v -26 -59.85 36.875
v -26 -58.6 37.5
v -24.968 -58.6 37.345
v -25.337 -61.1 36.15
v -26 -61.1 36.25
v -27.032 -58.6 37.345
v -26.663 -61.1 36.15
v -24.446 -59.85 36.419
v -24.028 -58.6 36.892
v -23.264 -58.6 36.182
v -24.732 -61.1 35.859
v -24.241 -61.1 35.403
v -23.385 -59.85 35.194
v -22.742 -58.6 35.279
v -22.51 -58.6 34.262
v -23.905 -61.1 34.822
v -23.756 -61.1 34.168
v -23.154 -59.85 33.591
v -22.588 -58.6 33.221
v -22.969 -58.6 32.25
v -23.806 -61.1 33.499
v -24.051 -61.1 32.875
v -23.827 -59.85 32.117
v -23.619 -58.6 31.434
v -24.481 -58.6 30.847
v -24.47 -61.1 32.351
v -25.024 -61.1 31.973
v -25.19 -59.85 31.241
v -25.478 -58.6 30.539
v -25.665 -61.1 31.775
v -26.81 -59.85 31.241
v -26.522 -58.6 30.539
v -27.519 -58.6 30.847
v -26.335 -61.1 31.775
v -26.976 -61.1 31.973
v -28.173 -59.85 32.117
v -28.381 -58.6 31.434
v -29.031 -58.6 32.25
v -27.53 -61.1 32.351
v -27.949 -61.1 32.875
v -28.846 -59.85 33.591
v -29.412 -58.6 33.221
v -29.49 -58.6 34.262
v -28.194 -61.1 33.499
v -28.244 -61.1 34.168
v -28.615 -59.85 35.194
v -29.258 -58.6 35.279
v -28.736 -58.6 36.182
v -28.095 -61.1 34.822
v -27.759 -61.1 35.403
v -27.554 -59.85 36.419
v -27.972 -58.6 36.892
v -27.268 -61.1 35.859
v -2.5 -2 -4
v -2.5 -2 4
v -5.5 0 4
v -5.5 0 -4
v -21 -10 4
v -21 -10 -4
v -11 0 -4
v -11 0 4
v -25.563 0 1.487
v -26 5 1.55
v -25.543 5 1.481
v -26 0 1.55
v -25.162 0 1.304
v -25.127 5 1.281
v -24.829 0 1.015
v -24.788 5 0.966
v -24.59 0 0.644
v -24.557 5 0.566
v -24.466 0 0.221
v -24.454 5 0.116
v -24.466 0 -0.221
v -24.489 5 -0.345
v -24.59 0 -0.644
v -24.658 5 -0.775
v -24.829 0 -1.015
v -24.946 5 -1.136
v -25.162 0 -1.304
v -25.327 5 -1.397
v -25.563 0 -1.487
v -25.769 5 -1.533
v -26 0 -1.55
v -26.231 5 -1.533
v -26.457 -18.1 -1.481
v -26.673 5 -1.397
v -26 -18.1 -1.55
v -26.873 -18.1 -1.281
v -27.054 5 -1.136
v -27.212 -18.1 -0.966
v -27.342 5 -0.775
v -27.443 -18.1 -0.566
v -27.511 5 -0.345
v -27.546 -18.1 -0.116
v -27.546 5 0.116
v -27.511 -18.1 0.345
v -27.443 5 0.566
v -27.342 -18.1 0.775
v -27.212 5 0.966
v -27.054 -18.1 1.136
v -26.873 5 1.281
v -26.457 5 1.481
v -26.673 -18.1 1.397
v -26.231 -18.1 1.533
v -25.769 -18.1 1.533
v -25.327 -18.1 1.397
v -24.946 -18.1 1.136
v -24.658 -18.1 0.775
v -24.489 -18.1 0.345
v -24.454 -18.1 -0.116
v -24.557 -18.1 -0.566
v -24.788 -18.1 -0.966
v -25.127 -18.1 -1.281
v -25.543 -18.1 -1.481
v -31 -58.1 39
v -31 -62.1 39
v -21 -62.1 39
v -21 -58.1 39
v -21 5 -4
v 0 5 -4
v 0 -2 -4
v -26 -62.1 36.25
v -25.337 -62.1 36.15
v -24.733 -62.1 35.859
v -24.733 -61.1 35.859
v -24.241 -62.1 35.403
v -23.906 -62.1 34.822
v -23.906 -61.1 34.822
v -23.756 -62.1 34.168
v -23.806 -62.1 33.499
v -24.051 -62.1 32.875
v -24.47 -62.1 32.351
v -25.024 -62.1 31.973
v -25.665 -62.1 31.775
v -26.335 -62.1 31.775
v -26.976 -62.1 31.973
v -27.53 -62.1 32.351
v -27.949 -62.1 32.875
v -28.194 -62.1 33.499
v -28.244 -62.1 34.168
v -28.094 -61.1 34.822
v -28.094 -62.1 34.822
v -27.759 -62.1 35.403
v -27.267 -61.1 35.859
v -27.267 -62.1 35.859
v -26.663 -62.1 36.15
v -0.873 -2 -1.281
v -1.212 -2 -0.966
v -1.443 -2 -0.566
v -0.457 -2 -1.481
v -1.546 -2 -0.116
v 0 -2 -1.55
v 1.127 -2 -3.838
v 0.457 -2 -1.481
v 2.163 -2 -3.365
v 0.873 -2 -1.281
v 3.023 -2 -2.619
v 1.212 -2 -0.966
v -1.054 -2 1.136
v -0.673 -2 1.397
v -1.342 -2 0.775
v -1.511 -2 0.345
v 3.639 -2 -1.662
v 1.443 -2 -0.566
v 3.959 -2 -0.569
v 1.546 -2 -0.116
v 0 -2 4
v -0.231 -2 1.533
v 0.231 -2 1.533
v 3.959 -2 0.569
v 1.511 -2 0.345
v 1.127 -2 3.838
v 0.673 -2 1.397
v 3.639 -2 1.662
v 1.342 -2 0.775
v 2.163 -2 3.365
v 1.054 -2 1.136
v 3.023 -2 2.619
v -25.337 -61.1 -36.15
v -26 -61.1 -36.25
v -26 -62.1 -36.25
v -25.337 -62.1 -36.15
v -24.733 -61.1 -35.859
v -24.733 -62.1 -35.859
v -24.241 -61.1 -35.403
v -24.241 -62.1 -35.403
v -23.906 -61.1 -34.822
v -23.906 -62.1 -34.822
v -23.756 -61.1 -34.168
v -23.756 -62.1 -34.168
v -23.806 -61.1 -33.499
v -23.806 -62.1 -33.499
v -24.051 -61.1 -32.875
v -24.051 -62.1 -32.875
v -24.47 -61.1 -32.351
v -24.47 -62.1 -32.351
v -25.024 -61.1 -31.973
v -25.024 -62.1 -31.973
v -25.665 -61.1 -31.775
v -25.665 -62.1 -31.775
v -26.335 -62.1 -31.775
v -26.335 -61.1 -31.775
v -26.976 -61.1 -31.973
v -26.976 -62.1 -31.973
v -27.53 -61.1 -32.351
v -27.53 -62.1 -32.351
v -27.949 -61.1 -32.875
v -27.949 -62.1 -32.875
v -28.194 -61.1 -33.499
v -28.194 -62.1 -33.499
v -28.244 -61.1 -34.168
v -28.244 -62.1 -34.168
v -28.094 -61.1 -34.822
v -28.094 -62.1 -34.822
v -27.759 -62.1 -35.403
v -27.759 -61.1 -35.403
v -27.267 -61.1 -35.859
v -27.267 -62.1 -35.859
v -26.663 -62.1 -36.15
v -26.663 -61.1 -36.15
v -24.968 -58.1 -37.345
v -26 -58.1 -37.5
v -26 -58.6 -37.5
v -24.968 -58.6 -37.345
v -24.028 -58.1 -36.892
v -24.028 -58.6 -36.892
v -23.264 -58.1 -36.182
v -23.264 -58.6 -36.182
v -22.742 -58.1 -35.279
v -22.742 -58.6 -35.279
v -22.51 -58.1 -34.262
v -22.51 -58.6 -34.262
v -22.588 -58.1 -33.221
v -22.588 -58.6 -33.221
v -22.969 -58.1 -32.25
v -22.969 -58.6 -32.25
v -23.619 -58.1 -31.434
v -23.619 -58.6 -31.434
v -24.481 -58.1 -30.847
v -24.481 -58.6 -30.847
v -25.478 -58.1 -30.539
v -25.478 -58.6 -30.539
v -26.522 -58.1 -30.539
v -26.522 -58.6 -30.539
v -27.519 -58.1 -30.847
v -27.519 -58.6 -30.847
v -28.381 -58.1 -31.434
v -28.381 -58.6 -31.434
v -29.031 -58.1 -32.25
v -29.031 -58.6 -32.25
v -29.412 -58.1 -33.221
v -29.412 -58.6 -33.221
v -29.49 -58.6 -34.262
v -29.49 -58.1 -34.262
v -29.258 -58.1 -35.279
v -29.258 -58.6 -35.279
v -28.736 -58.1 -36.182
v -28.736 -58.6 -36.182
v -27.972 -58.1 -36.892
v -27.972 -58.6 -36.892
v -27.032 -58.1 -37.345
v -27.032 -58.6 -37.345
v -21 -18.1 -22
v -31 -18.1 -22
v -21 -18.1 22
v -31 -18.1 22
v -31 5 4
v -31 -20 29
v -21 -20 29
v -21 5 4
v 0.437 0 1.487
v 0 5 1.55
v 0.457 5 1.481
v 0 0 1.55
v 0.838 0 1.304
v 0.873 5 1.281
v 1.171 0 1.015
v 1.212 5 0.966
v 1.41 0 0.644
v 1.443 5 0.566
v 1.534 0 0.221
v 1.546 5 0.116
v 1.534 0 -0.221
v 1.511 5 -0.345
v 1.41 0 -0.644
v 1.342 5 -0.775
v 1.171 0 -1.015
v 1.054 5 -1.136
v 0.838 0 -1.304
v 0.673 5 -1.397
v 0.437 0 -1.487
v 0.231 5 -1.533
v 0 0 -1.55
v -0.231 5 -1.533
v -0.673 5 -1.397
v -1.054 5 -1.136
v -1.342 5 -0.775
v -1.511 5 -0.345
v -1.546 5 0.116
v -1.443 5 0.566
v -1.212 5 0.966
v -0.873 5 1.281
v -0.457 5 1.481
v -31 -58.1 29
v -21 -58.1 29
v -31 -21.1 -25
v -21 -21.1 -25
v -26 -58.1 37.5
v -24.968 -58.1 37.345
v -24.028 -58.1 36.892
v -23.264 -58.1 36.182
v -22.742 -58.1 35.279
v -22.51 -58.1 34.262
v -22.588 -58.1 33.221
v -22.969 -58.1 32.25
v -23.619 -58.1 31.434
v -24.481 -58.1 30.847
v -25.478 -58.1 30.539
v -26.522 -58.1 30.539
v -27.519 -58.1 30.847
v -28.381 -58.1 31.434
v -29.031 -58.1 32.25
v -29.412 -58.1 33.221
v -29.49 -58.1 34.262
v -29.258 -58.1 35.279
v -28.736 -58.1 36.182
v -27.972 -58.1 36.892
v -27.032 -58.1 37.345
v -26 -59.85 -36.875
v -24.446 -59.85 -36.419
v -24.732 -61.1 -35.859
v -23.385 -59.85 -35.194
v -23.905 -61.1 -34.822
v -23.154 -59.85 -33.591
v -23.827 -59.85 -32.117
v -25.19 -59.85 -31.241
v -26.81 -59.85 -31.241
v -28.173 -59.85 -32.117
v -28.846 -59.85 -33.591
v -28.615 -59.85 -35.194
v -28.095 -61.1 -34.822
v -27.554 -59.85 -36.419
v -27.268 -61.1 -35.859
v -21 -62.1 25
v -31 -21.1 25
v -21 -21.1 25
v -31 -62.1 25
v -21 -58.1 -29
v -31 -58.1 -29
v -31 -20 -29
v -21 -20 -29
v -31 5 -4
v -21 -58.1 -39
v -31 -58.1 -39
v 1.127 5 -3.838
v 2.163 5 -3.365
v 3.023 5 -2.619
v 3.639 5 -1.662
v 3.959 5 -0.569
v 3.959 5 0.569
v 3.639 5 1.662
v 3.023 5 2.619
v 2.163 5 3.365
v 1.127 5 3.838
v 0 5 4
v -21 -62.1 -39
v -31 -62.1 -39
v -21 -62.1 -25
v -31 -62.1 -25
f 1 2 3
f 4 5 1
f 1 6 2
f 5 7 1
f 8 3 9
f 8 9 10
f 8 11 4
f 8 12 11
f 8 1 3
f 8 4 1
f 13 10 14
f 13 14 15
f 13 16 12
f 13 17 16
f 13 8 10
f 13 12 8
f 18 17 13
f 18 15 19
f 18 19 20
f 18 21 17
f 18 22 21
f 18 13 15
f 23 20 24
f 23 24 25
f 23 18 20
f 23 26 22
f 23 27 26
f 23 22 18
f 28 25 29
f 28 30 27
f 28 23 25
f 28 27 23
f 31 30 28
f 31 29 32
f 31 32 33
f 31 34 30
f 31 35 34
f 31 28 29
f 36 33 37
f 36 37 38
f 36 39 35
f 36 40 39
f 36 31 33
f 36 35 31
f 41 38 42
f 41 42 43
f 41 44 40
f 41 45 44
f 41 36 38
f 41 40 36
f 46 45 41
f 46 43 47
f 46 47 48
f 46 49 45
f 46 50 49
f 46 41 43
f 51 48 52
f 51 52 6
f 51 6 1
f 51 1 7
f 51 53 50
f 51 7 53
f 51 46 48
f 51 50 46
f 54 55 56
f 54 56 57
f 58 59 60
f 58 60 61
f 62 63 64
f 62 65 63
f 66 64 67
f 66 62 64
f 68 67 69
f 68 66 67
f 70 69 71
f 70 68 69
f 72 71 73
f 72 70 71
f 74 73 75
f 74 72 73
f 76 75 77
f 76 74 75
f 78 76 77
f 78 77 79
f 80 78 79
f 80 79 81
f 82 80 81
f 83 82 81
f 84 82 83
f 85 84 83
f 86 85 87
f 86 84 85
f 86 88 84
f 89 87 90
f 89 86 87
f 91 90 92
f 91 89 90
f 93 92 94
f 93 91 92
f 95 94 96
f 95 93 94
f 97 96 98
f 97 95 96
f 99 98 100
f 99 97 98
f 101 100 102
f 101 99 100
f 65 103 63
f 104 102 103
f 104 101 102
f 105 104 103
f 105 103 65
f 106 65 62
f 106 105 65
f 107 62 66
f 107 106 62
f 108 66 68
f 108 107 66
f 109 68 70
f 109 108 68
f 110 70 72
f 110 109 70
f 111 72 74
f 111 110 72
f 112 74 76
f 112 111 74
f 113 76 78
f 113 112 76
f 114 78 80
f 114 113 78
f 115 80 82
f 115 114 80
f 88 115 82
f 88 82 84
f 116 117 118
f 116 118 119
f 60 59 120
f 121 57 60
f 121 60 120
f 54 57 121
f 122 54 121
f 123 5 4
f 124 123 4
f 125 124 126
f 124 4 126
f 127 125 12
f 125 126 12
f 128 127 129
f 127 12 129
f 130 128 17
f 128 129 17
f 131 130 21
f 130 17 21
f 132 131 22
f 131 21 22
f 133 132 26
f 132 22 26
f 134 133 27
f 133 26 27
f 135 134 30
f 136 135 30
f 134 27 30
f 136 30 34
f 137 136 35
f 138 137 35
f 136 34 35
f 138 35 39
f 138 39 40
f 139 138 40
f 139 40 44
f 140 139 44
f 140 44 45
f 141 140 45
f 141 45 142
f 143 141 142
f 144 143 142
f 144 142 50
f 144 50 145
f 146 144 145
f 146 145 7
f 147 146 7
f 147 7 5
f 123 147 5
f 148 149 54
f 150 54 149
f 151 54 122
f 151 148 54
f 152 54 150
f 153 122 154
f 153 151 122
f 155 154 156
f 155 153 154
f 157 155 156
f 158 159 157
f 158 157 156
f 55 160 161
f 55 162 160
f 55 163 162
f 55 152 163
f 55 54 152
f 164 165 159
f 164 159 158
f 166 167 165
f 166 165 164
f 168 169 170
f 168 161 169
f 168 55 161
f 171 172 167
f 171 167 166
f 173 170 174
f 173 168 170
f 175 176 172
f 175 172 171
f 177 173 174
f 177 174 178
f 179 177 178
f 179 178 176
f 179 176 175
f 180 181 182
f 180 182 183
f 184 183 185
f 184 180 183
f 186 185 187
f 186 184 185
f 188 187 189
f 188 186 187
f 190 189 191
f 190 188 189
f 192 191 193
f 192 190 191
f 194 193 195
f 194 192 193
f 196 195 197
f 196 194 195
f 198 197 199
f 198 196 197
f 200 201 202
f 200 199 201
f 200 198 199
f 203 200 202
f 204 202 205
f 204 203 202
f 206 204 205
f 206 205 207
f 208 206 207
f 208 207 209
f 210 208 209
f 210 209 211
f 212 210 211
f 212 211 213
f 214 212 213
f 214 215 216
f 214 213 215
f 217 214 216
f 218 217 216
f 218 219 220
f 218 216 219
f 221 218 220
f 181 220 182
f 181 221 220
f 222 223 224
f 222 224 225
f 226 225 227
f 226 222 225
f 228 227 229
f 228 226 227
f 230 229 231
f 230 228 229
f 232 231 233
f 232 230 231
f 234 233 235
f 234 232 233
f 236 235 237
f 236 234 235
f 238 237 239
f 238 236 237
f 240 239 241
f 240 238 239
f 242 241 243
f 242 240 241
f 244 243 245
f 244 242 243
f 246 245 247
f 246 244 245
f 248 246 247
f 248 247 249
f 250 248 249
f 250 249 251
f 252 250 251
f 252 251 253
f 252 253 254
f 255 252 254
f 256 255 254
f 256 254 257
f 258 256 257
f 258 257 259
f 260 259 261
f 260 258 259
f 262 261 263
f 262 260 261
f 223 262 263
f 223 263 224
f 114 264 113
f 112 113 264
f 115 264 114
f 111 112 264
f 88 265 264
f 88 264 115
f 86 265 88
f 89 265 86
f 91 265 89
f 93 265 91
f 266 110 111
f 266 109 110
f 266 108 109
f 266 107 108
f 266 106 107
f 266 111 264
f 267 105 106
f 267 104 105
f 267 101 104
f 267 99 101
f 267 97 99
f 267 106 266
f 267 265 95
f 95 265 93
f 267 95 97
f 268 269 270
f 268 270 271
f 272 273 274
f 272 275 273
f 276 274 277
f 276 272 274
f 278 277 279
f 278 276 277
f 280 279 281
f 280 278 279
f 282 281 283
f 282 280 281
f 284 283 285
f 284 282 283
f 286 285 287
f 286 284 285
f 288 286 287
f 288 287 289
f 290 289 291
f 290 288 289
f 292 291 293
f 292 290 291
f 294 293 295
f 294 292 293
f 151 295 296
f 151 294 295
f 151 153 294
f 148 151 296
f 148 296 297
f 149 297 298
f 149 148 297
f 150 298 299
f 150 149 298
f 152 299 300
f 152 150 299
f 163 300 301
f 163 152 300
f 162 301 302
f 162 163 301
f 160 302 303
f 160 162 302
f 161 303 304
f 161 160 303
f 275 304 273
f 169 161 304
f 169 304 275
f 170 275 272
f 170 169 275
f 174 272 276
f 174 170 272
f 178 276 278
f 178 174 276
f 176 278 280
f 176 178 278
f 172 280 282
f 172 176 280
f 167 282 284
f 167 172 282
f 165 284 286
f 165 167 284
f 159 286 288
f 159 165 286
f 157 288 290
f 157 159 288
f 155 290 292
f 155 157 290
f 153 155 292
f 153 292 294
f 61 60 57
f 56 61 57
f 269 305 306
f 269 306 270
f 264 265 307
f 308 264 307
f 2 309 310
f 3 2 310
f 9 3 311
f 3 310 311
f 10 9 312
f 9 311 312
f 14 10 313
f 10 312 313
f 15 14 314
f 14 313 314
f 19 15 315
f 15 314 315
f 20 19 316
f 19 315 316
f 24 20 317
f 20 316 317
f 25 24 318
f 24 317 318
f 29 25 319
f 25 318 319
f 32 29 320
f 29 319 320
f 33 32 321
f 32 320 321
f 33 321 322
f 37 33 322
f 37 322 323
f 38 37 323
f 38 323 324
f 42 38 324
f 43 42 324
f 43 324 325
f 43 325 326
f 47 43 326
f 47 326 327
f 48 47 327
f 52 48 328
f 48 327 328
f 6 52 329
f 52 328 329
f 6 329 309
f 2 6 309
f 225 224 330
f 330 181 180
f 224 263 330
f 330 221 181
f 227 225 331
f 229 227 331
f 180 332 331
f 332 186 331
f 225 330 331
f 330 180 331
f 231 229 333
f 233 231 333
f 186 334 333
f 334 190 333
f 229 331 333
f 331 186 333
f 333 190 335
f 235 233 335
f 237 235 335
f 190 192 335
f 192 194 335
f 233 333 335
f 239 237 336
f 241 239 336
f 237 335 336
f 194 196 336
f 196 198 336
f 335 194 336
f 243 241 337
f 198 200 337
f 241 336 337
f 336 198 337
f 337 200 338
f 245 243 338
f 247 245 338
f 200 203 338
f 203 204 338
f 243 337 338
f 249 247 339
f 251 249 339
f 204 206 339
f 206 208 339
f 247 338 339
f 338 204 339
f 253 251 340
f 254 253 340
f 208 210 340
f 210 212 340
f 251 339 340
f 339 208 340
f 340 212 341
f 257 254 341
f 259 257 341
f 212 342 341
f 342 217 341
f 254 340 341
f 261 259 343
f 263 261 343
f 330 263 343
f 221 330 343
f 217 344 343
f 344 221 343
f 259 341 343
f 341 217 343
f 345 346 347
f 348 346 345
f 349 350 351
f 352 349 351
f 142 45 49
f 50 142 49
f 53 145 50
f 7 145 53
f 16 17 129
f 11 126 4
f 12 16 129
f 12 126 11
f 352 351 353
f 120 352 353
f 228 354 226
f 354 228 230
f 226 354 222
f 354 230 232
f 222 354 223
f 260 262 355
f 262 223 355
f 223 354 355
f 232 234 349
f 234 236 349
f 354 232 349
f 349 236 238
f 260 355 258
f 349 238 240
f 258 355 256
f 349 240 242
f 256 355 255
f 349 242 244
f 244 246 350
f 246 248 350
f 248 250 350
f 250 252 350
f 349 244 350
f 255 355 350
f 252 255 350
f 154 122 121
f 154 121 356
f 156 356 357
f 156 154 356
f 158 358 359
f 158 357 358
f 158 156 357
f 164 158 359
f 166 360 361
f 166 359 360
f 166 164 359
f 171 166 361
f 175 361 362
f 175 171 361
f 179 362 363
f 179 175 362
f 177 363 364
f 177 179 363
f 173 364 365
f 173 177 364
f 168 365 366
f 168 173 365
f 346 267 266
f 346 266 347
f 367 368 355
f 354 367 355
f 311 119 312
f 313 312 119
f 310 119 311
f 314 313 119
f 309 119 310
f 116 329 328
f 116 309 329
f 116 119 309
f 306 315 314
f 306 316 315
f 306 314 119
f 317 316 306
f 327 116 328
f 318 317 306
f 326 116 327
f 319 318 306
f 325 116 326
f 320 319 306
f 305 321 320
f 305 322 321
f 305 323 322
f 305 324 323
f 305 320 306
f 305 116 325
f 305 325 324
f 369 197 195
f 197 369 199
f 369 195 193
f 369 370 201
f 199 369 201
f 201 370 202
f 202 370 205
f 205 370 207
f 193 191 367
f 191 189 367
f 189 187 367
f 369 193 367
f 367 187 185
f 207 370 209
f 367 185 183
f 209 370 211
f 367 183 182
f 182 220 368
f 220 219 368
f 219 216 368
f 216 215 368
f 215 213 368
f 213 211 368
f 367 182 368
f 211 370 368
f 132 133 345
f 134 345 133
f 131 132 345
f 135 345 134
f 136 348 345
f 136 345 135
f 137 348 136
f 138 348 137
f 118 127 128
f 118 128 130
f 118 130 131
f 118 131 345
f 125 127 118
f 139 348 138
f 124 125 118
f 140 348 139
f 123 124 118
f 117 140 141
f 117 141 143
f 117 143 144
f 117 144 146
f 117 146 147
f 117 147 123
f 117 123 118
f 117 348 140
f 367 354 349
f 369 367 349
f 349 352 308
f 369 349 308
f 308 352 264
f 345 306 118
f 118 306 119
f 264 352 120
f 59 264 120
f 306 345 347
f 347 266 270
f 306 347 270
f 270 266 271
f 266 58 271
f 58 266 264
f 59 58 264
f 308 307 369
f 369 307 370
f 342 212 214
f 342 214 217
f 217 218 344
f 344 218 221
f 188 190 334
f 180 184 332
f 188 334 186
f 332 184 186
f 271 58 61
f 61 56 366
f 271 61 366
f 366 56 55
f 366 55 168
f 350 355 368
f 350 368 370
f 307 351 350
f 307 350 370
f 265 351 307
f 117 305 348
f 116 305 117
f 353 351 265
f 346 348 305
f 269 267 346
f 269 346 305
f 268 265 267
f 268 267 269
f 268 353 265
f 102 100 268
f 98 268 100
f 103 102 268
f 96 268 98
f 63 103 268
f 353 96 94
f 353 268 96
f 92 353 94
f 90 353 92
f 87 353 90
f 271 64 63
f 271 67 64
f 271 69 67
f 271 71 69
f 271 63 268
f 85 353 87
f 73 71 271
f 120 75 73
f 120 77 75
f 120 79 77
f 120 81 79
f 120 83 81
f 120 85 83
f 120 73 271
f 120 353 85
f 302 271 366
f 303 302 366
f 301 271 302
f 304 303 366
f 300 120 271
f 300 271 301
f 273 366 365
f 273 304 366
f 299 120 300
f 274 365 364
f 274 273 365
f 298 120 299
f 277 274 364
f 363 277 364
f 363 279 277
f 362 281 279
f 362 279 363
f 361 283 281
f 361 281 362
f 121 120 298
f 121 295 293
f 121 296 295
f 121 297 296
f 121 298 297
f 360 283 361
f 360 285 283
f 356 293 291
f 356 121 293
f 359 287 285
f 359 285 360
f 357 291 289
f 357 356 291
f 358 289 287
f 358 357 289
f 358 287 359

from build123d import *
from build123d.topology import SkipClean

# Parameters (mm, degrees)
SKETCH1_R                 = 1.55
BOSS_EXTRUDE1_DEPTH       = 5
BOSS_EXTRUDE2_START       = 2
SKETCH2_R                 = 1.55
BOSS_EXTRUDE2_DEPTH       = 2
CHAMFER1_SIZE2            = 2
CHAMFER1_SIZE             = 3
BOSS_EXTRUDE3_START       = 18.1
SKETCH3_W                 = 10
SKETCH3_H                 = 8
SKETCH3_R                 = 1.55
BOSS_EXTRUDE3_DEPTH       = 18.1
BOSS_EXTRUDE4_DEPTH       = 10
CHAMFER2_SIZE             = 10
SKETCH6_R                 = 2.25
CUT_EXTRUDE2_DEPTH        = 81.396579529
SKETCH7_R                 = 3.5
CUT_EXTRUDE3_DEPTH        = 3
CHAMFER3_SIZE2            = 1.25
CHAMFER3_SIZE             = 2.5
CHAMFER3_OF_MIRROR2_SIZE2 = 1.25
CHAMFER3_OF_MIRROR2_SIZE  = 2.5


with BuildPart() as part:
    # Sketch1 → Boss-Extrude1 (new body)
    with BuildSketch(Plane(origin=(0, 0, 0), x_dir=(1, 0, 0), z_dir=(0, 1, 0))):
        with BuildLine():
            Line((0, 4), (-31, 4))
            Line((-31, 4), (-31, -4))
            Line((-31, -4), (0, -4))
            ThreePointArc((0, -4), (4, 0), (0, 4))
        make_face()
        with Locations(Location((0, 0, 0), (0, 0, 270))):
            Circle(SKETCH1_R, mode=Mode.SUBTRACT)
        with Locations(Location((-26, 0, 0), (0, 0, 270))):
            Circle(SKETCH1_R, mode=Mode.SUBTRACT)
    extrude(amount=BOSS_EXTRUDE1_DEPTH)

    # Sketch2 → Boss-Extrude2 (add)
    with SkipClean():  # the faces are left unmerged after this step: merging them gives an invalid solid
        with BuildSketch(Plane.XZ.offset(BOSS_EXTRUDE2_START)):
            with BuildLine():
                Line((0, 4), (-2.5, 4))
                Line((-2.5, 4), (-2.5, -4))
                Line((-2.5, -4), (0, -4))
                ThreePointArc((0, -4), (4, 0), (0, 4))
            make_face()
            with Locations(Location((0, 0, 0), (0, 0, 270))):
                Circle(SKETCH2_R, mode=Mode.SUBTRACT)
        extrude(amount=-BOSS_EXTRUDE2_DEPTH)

    # Chamfer1
    chamfer1_edges = [part.edges().sort_by_distance(p)[0] for p in [
        (-2.5, 0, 0),
    ]]
    chamfer1_side = [part.faces().sort_by_distance(p)[0] for p in [
        (-2.54, 0, 0),
    ]]
    chamfer(chamfer1_edges, length=CHAMFER1_SIZE - 0.0001, length2=CHAMFER1_SIZE2 - 0.0001, reference=chamfer1_side[0])  # a hair under: the kernel refuses the full size

    # Sketch3 → Boss-Extrude3 (add)
    with BuildSketch(Plane.XZ.offset(BOSS_EXTRUDE3_START)):
        with Locations((-26, 0)):
            Rectangle(SKETCH3_W, SKETCH3_H)
        with Locations(Location((-26, 0, 0), (0, 0, 270))):
            Circle(SKETCH3_R, mode=Mode.SUBTRACT)
    extrude(amount=-BOSS_EXTRUDE3_DEPTH)

    # Sketch4 → Boss-Extrude4 (add)
    with BuildSketch(Plane.ZY.offset(31)):
        Polygon((-4, -18.1), (-22, -18.1), (-25, -21.1), (-25, -62.1), (-39, -62.1), (-39, -58.1), (-29, -58.1), (-29, -20), (-4, 5), align=None)
    boss_extrude4 = extrude(amount=-BOSS_EXTRUDE4_DEPTH)

    # Mirror1: Boss-Extrude4 across plane
    add(boss_extrude4.mirror(Plane.XY))

    # Chamfer2
    chamfer2_edges = [part.edges().sort_by_distance(p)[0] for p in [
        (-21, 0, 0),
    ]]
    chamfer(chamfer2_edges, length=CHAMFER2_SIZE)

    # Sketch6 → Cut-Extrude2 (cut, through all)
    with BuildSketch(Plane(origin=(0, -58.1, 0), x_dir=(1, 0, 0), z_dir=(0, 1, 0))):
        with Locations(Location((-26, -34, 0), (0, 0, 270))):
            Circle(SKETCH6_R)
    cut_extrude2 = extrude(amount=-CUT_EXTRUDE2_DEPTH, mode=Mode.SUBTRACT)

    # Sketch7 → Cut-Extrude3 (cut)
    with BuildSketch(Plane(origin=(0, -58.1, 0), x_dir=(1, 0, 0), z_dir=(0, 1, 0))):
        with Locations(Location((-26, -34, 0), (0, 0, 270))):
            Circle(SKETCH7_R)
    cut_extrude3 = extrude(amount=-CUT_EXTRUDE3_DEPTH, mode=Mode.SUBTRACT)

    # Chamfer3
    chamfer3_edges = [part.edges().sort_by_distance(p)[0] for p in [
        (-26, -61.1, 30.5),
    ]]
    chamfer3_side = [part.faces().sort_by_distance(p)[0] for p in [
        (-26, -61.075, 30.5),
    ]]
    chamfer(chamfer3_edges, length=CHAMFER3_SIZE - 0.0001, length2=CHAMFER3_SIZE2 - 0.0001, reference=chamfer3_side[0])  # a hair under: the kernel refuses the full size

    # Mirror2: Cut-Extrude2, Cut-Extrude3 across plane
    add(cut_extrude2.mirror(Plane.XY), mode=Mode.SUBTRACT)
    add(cut_extrude3.mirror(Plane.XY), mode=Mode.SUBTRACT)

    # Chamfer3 of Mirror2
    chamfer3_of_mirror2_edges = [part.edges().sort_by_distance(p)[0] for p in [
        (-26, -61.1, -30.5),
    ]]
    chamfer3_of_mirror2_side = [part.faces().sort_by_distance(p)[0] for p in [
        (-26, -61.075, -30.5),
    ]]
    chamfer(chamfer3_of_mirror2_edges, length=CHAMFER3_OF_MIRROR2_SIZE - 0.0001, length2=CHAMFER3_OF_MIRROR2_SIZE2 - 0.0001, reference=chamfer3_of_mirror2_side[0])  # a hair under: the kernel refuses the full size


solid = part.part
